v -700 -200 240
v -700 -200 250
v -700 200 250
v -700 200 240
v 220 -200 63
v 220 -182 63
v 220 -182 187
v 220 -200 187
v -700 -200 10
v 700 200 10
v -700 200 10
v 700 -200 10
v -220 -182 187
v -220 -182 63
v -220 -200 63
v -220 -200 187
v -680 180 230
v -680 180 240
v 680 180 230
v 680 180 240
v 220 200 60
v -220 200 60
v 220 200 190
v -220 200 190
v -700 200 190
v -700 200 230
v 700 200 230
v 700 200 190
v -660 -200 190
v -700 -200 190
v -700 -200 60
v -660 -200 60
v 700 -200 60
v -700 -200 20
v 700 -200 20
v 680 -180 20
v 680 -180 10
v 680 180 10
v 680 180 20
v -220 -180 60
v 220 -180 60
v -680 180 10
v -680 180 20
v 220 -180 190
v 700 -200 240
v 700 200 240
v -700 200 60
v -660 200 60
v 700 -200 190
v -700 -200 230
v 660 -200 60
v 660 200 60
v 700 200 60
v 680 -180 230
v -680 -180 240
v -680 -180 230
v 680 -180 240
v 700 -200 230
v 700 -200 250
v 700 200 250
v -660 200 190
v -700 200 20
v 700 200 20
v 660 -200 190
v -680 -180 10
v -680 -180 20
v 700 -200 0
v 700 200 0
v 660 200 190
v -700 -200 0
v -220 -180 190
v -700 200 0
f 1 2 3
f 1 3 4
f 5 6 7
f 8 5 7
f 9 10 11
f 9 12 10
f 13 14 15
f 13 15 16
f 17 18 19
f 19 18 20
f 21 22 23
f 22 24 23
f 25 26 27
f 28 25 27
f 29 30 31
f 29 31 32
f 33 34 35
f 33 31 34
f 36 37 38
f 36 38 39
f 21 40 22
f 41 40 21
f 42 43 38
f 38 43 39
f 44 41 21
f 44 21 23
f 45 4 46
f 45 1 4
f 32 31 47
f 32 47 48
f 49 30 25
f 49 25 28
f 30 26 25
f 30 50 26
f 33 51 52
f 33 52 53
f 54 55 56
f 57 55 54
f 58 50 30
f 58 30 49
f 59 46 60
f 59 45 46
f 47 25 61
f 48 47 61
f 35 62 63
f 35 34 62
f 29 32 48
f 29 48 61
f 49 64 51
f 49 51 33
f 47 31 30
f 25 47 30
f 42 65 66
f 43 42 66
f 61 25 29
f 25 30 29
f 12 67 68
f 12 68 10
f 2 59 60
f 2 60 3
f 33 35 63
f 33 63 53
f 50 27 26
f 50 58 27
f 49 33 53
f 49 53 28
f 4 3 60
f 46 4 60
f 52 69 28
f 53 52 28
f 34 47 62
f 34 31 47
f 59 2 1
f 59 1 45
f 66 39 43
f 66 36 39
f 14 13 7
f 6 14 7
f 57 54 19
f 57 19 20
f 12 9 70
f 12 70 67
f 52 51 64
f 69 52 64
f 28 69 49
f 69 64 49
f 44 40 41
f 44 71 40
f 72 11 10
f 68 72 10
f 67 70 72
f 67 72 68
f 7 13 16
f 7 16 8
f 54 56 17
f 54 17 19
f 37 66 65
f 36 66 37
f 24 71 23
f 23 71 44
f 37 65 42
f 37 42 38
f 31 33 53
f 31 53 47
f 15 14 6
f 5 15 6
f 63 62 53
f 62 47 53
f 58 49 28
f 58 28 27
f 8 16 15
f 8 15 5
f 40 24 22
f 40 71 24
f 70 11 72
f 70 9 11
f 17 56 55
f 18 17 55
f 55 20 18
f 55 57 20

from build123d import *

# Parameters (mm, degrees)
F0_W          = 680
F0_H          = 10
F1_DEPTH      = 180
F1_DEPTH_BACK = 180
F2_DEPTH      = 200
F2_DEPTH_BACK = 200
F0_W_2        = 40
F0_H_2        = 130
F3_DEPTH      = 200
F3_DEPTH_BACK = 200
F4_START      = 182
F0_W_3        = 440
F0_H_3        = 124
F4_DEPTH      = 18
F0_H_4        = 3
F5_DEPTH      = 180
F5_DEPTH_BACK = 200


with BuildPart() as f1:
    # F0 (on Front) → F1 (new body, two sides)
    with BuildSketch(Plane.XZ) as f1_sk:
        with Locations((-340, 235)):
            Rectangle(F0_W, F0_H)
        with Locations((340, 235)):
            Rectangle(F0_W, F0_H)
    extrude(amount=F1_DEPTH)
    extrude(f1_sk.sketch, amount=-F1_DEPTH_BACK)


with BuildPart() as f1b:
    # F0 (on Front) → F1, piece 2 (new body, two sides)
    with BuildSketch(Plane.XZ) as f1_2_sk:
        with Locations((-340, 15)):
            Rectangle(F0_W, F0_H)
        with Locations((340, 15)):
            Rectangle(F0_W, F0_H)
    extrude(amount=F1_DEPTH)
    extrude(f1_2_sk.sketch, amount=-F1_DEPTH_BACK)


with BuildPart() as f2:
    # F0 (on Front) → F2 (new body, two sides)
    with BuildSketch(Plane.XZ) as f2_sk:
        Polygon((-680, 10), (-700, 10), (-700, 0), (700, 0), (700, 10), (680, 10), (0, 10), align=None)
    extrude(amount=F2_DEPTH)
    extrude(f2_sk.sketch, amount=-F2_DEPTH_BACK)


with BuildPart() as f2b:
    # F0 (on Front) → F2, piece 2 (new body, two sides)
    with BuildSketch(Plane.XZ) as f2_2_sk:
        with Locations((-680, 125)):
            Rectangle(F0_W_2, F0_H_2)
    extrude(amount=F2_DEPTH)
    extrude(f2_2_sk.sketch, amount=-F2_DEPTH_BACK)


with BuildPart() as f2c:
    # F0 (on Front) → F2, piece 3 (new body, two sides)
    with BuildSketch(Plane.XZ) as f2_3_sk:
        with Locations((680, 125)):
            Rectangle(F0_W_2, F0_H_2)
    extrude(amount=F2_DEPTH)
    extrude(f2_3_sk.sketch, amount=-F2_DEPTH_BACK)


with BuildPart() as f2d:
    # F0 (on Front) → F2, piece 4 (new body, two sides)
    with BuildSketch(Plane.XZ) as f2_4_sk:
        Polygon((0, 250), (0, 240), (680, 240), (700, 240), (700, 250), align=None)
        Polygon((-700, 240), (-680, 240), (0, 240), (0, 250), (-700, 250), align=None)
    extrude(amount=F2_DEPTH)
    extrude(f2_4_sk.sketch, amount=-F2_DEPTH_BACK)


with BuildPart() as f3:
    # F0 (on Front) → F3 (new body, two sides)
    with BuildSketch(Plane.XZ) as f3_sk:
        Polygon((-700, 230), (-700, 190), (-660, 190), (-220, 190), (220, 190), (660, 190), (700, 190), (700, 230), (680, 230), (0, 230), (-680, 230), align=None)
    extrude(amount=F3_DEPTH)
    extrude(f3_sk.sketch, amount=-F3_DEPTH_BACK)


with BuildPart() as f3b:
    # F0 (on Front) → F3, piece 2 (new body, two sides)
    with BuildSketch(Plane.XZ) as f3_2_sk:
        Polygon((-700, 20), (-680, 20), (0, 20), (0, 60), (-220, 60), (-660, 60), (-700, 60), align=None)
        Polygon((0, 60), (0, 20), (680, 20), (700, 20), (700, 60), (660, 60), (220, 60), align=None)
    extrude(amount=F3_DEPTH)
    extrude(f3_2_sk.sketch, amount=-F3_DEPTH_BACK)


with BuildPart() as f4:
    # F0 (on Front) → F4 (new body)
    with BuildSketch(Plane.XZ.offset(F4_START)):
        with Locations((0, 125)):
            Rectangle(F0_W_3, F0_H_3)
    extrude(amount=F4_DEPTH)


with BuildPart() as f5:
    # F0 (on Front) → F5 (new body, two sides)
    with BuildSketch(Plane.XZ) as f5_sk:
        with Locations((0, 125)):
            Rectangle(F0_W_3, F0_H_3)
        Polygon((-220, 60), (0, 60), (220, 60), (220, 63), (-220, 63), align=None)
        with Locations((0, 188.5)):
            Rectangle(F0_W_3, F0_H_4)
    extrude(amount=F5_DEPTH)
    extrude(f5_sk.sketch, amount=-F5_DEPTH_BACK)


solid = Compound([f1.part, f1b.part, f2.part, f2b.part, f2c.part, f2d.part, f3.part, f3b.part, f4.part, f5.part])
